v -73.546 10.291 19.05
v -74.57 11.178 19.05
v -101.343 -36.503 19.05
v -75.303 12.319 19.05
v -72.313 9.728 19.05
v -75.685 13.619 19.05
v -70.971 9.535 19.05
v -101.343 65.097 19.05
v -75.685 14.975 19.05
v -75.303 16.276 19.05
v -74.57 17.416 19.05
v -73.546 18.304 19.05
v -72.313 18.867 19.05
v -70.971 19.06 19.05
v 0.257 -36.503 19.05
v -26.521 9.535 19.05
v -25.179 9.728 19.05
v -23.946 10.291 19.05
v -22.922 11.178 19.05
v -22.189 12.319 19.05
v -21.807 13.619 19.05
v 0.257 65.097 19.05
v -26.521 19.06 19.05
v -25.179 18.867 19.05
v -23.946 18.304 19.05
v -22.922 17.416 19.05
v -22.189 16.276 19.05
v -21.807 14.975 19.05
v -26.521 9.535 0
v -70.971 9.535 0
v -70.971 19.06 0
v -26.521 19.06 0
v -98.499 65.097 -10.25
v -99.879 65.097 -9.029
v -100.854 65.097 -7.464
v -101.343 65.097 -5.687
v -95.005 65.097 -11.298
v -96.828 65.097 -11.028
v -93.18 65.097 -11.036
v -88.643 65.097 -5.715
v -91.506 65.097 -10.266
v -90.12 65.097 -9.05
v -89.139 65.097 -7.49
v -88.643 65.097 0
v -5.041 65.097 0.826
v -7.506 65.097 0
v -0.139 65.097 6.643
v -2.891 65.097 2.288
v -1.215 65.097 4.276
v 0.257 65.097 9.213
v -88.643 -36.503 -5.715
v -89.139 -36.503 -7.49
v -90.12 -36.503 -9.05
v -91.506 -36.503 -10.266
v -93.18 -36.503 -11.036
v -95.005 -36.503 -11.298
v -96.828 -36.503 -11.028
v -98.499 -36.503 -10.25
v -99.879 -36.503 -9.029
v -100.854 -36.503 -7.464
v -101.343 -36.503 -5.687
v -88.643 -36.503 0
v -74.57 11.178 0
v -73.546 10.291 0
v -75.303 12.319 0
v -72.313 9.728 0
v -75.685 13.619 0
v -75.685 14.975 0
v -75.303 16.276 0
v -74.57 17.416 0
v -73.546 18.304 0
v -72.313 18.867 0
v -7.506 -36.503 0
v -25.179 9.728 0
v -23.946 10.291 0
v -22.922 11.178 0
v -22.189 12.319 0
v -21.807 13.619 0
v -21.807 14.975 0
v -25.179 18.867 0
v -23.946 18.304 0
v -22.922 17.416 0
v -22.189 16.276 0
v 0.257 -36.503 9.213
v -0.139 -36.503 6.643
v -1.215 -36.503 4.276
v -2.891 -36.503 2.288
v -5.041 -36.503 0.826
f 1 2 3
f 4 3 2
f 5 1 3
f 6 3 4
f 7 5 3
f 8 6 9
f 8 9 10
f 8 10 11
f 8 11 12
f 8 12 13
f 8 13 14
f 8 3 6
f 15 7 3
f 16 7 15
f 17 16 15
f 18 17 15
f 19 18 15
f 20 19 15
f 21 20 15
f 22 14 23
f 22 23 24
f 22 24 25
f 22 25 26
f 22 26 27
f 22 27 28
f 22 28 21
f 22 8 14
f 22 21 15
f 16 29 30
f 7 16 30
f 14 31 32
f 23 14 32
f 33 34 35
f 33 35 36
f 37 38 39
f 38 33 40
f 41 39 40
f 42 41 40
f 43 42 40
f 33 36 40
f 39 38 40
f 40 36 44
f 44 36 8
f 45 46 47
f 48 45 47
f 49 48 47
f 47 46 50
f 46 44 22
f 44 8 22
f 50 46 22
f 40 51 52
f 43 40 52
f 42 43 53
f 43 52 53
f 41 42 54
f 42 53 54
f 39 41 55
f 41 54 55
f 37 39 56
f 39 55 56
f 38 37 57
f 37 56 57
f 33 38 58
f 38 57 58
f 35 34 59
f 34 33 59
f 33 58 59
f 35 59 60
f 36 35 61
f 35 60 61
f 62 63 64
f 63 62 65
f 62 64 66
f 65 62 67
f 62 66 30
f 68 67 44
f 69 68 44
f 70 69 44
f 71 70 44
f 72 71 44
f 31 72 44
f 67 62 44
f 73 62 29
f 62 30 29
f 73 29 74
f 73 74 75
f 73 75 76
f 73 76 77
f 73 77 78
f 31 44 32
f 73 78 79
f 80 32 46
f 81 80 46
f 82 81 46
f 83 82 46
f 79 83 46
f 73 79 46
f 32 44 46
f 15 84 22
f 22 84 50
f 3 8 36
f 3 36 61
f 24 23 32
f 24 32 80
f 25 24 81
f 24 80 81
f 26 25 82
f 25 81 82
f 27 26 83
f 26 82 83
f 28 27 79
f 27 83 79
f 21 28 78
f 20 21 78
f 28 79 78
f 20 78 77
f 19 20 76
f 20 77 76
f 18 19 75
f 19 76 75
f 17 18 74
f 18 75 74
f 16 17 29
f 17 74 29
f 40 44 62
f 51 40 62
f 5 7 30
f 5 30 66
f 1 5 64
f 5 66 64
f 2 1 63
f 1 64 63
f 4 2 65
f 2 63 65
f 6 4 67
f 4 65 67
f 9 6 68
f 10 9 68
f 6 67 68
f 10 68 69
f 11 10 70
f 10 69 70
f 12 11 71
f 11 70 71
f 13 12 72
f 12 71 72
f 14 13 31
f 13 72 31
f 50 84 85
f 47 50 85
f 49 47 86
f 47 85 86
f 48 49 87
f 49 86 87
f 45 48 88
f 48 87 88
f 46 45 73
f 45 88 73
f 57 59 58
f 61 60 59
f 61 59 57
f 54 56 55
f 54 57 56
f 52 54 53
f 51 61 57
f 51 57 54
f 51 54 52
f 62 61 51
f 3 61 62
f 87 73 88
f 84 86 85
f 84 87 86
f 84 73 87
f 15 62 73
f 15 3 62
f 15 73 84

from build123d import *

# Parameters (mm, degrees)
F0_W     = 101.6
F0_H     = 101.6
F1_DEPTH = 19.05
F2_W     = 12.7
F2_H     = 101.6
F3_DEPTH = 11.43
F5_DEPTH = 101.601
F6_DEPTH = 101.601


with BuildPart() as f1:
    # F0 (on Top) → F1 (new body)
    with BuildSketch(Plane.XY):
        with Locations((-50.5425002087, 14.2971096218)):
            Rectangle(F0_W, F0_H)
        with BuildLine():
            ThreePointArc((-70.9710493684, 9.5346096218), (-75.7335493684, 14.2971096218), (-70.9710493684, 19.0596096218))
            Line((-70.9710493684, 19.0596096218), (-26.5210493684, 19.0596096218))
            ThreePointArc((-26.5210493684, 19.0596096218), (-21.7585493684, 14.2971096218), (-26.5210493684, 9.5346096218))
            Line((-26.5210493684, 9.5346096218), (-70.9710493684, 9.5346096218))
        make_face(mode=Mode.SUBTRACT)
    extrude(amount=F1_DEPTH)

    # F2 (on face) → F3 (join)
    with BuildSketch(Plane(origin=(0, 0, 0), x_dir=(1, 0, 0), z_dir=(0, 0, -1))):
        with Locations((-94.9925002087, -14.2971096218)):
            Rectangle(F2_W, F2_H)
    extrude(amount=F3_DEPTH)

    # F4 (on face) → F5 (cut, through all)
    with BuildSketch(Plane.XZ.offset(36.5028903782)):
        with BuildLine():
            ThreePointArc((0.2574997913, 9.2125750211), (-1.9847896018, 3.2247694582), (-7.5058890507, 0))
            Line((-7.5058890507, 0), (0.2574997913, 0))
            Line((0.2574997913, 0), (0.2574997913, 9.2125750211))
        make_face()
    extrude(amount=-F5_DEPTH, mode=Mode.SUBTRACT)

    # F4 (on face) → F6 (cut, through all)
    with BuildSketch(Plane.XZ.offset(36.5028903782)):
        with BuildLine():
            Line((-88.6425002087, -11.43), (-88.6425002087, -5.715))
            ThreePointArc((-88.6425002087, -5.715), (-95.0047463509, -11.2975338614), (-101.3425002087, -5.6872097775))
            Line((-101.3425002087, -5.6872097775), (-101.3425002087, -11.43))
            Line((-101.3425002087, -11.43), (-88.6425002087, -11.43))
        make_face()
    extrude(amount=-F6_DEPTH, mode=Mode.SUBTRACT)


solid = f1.part
